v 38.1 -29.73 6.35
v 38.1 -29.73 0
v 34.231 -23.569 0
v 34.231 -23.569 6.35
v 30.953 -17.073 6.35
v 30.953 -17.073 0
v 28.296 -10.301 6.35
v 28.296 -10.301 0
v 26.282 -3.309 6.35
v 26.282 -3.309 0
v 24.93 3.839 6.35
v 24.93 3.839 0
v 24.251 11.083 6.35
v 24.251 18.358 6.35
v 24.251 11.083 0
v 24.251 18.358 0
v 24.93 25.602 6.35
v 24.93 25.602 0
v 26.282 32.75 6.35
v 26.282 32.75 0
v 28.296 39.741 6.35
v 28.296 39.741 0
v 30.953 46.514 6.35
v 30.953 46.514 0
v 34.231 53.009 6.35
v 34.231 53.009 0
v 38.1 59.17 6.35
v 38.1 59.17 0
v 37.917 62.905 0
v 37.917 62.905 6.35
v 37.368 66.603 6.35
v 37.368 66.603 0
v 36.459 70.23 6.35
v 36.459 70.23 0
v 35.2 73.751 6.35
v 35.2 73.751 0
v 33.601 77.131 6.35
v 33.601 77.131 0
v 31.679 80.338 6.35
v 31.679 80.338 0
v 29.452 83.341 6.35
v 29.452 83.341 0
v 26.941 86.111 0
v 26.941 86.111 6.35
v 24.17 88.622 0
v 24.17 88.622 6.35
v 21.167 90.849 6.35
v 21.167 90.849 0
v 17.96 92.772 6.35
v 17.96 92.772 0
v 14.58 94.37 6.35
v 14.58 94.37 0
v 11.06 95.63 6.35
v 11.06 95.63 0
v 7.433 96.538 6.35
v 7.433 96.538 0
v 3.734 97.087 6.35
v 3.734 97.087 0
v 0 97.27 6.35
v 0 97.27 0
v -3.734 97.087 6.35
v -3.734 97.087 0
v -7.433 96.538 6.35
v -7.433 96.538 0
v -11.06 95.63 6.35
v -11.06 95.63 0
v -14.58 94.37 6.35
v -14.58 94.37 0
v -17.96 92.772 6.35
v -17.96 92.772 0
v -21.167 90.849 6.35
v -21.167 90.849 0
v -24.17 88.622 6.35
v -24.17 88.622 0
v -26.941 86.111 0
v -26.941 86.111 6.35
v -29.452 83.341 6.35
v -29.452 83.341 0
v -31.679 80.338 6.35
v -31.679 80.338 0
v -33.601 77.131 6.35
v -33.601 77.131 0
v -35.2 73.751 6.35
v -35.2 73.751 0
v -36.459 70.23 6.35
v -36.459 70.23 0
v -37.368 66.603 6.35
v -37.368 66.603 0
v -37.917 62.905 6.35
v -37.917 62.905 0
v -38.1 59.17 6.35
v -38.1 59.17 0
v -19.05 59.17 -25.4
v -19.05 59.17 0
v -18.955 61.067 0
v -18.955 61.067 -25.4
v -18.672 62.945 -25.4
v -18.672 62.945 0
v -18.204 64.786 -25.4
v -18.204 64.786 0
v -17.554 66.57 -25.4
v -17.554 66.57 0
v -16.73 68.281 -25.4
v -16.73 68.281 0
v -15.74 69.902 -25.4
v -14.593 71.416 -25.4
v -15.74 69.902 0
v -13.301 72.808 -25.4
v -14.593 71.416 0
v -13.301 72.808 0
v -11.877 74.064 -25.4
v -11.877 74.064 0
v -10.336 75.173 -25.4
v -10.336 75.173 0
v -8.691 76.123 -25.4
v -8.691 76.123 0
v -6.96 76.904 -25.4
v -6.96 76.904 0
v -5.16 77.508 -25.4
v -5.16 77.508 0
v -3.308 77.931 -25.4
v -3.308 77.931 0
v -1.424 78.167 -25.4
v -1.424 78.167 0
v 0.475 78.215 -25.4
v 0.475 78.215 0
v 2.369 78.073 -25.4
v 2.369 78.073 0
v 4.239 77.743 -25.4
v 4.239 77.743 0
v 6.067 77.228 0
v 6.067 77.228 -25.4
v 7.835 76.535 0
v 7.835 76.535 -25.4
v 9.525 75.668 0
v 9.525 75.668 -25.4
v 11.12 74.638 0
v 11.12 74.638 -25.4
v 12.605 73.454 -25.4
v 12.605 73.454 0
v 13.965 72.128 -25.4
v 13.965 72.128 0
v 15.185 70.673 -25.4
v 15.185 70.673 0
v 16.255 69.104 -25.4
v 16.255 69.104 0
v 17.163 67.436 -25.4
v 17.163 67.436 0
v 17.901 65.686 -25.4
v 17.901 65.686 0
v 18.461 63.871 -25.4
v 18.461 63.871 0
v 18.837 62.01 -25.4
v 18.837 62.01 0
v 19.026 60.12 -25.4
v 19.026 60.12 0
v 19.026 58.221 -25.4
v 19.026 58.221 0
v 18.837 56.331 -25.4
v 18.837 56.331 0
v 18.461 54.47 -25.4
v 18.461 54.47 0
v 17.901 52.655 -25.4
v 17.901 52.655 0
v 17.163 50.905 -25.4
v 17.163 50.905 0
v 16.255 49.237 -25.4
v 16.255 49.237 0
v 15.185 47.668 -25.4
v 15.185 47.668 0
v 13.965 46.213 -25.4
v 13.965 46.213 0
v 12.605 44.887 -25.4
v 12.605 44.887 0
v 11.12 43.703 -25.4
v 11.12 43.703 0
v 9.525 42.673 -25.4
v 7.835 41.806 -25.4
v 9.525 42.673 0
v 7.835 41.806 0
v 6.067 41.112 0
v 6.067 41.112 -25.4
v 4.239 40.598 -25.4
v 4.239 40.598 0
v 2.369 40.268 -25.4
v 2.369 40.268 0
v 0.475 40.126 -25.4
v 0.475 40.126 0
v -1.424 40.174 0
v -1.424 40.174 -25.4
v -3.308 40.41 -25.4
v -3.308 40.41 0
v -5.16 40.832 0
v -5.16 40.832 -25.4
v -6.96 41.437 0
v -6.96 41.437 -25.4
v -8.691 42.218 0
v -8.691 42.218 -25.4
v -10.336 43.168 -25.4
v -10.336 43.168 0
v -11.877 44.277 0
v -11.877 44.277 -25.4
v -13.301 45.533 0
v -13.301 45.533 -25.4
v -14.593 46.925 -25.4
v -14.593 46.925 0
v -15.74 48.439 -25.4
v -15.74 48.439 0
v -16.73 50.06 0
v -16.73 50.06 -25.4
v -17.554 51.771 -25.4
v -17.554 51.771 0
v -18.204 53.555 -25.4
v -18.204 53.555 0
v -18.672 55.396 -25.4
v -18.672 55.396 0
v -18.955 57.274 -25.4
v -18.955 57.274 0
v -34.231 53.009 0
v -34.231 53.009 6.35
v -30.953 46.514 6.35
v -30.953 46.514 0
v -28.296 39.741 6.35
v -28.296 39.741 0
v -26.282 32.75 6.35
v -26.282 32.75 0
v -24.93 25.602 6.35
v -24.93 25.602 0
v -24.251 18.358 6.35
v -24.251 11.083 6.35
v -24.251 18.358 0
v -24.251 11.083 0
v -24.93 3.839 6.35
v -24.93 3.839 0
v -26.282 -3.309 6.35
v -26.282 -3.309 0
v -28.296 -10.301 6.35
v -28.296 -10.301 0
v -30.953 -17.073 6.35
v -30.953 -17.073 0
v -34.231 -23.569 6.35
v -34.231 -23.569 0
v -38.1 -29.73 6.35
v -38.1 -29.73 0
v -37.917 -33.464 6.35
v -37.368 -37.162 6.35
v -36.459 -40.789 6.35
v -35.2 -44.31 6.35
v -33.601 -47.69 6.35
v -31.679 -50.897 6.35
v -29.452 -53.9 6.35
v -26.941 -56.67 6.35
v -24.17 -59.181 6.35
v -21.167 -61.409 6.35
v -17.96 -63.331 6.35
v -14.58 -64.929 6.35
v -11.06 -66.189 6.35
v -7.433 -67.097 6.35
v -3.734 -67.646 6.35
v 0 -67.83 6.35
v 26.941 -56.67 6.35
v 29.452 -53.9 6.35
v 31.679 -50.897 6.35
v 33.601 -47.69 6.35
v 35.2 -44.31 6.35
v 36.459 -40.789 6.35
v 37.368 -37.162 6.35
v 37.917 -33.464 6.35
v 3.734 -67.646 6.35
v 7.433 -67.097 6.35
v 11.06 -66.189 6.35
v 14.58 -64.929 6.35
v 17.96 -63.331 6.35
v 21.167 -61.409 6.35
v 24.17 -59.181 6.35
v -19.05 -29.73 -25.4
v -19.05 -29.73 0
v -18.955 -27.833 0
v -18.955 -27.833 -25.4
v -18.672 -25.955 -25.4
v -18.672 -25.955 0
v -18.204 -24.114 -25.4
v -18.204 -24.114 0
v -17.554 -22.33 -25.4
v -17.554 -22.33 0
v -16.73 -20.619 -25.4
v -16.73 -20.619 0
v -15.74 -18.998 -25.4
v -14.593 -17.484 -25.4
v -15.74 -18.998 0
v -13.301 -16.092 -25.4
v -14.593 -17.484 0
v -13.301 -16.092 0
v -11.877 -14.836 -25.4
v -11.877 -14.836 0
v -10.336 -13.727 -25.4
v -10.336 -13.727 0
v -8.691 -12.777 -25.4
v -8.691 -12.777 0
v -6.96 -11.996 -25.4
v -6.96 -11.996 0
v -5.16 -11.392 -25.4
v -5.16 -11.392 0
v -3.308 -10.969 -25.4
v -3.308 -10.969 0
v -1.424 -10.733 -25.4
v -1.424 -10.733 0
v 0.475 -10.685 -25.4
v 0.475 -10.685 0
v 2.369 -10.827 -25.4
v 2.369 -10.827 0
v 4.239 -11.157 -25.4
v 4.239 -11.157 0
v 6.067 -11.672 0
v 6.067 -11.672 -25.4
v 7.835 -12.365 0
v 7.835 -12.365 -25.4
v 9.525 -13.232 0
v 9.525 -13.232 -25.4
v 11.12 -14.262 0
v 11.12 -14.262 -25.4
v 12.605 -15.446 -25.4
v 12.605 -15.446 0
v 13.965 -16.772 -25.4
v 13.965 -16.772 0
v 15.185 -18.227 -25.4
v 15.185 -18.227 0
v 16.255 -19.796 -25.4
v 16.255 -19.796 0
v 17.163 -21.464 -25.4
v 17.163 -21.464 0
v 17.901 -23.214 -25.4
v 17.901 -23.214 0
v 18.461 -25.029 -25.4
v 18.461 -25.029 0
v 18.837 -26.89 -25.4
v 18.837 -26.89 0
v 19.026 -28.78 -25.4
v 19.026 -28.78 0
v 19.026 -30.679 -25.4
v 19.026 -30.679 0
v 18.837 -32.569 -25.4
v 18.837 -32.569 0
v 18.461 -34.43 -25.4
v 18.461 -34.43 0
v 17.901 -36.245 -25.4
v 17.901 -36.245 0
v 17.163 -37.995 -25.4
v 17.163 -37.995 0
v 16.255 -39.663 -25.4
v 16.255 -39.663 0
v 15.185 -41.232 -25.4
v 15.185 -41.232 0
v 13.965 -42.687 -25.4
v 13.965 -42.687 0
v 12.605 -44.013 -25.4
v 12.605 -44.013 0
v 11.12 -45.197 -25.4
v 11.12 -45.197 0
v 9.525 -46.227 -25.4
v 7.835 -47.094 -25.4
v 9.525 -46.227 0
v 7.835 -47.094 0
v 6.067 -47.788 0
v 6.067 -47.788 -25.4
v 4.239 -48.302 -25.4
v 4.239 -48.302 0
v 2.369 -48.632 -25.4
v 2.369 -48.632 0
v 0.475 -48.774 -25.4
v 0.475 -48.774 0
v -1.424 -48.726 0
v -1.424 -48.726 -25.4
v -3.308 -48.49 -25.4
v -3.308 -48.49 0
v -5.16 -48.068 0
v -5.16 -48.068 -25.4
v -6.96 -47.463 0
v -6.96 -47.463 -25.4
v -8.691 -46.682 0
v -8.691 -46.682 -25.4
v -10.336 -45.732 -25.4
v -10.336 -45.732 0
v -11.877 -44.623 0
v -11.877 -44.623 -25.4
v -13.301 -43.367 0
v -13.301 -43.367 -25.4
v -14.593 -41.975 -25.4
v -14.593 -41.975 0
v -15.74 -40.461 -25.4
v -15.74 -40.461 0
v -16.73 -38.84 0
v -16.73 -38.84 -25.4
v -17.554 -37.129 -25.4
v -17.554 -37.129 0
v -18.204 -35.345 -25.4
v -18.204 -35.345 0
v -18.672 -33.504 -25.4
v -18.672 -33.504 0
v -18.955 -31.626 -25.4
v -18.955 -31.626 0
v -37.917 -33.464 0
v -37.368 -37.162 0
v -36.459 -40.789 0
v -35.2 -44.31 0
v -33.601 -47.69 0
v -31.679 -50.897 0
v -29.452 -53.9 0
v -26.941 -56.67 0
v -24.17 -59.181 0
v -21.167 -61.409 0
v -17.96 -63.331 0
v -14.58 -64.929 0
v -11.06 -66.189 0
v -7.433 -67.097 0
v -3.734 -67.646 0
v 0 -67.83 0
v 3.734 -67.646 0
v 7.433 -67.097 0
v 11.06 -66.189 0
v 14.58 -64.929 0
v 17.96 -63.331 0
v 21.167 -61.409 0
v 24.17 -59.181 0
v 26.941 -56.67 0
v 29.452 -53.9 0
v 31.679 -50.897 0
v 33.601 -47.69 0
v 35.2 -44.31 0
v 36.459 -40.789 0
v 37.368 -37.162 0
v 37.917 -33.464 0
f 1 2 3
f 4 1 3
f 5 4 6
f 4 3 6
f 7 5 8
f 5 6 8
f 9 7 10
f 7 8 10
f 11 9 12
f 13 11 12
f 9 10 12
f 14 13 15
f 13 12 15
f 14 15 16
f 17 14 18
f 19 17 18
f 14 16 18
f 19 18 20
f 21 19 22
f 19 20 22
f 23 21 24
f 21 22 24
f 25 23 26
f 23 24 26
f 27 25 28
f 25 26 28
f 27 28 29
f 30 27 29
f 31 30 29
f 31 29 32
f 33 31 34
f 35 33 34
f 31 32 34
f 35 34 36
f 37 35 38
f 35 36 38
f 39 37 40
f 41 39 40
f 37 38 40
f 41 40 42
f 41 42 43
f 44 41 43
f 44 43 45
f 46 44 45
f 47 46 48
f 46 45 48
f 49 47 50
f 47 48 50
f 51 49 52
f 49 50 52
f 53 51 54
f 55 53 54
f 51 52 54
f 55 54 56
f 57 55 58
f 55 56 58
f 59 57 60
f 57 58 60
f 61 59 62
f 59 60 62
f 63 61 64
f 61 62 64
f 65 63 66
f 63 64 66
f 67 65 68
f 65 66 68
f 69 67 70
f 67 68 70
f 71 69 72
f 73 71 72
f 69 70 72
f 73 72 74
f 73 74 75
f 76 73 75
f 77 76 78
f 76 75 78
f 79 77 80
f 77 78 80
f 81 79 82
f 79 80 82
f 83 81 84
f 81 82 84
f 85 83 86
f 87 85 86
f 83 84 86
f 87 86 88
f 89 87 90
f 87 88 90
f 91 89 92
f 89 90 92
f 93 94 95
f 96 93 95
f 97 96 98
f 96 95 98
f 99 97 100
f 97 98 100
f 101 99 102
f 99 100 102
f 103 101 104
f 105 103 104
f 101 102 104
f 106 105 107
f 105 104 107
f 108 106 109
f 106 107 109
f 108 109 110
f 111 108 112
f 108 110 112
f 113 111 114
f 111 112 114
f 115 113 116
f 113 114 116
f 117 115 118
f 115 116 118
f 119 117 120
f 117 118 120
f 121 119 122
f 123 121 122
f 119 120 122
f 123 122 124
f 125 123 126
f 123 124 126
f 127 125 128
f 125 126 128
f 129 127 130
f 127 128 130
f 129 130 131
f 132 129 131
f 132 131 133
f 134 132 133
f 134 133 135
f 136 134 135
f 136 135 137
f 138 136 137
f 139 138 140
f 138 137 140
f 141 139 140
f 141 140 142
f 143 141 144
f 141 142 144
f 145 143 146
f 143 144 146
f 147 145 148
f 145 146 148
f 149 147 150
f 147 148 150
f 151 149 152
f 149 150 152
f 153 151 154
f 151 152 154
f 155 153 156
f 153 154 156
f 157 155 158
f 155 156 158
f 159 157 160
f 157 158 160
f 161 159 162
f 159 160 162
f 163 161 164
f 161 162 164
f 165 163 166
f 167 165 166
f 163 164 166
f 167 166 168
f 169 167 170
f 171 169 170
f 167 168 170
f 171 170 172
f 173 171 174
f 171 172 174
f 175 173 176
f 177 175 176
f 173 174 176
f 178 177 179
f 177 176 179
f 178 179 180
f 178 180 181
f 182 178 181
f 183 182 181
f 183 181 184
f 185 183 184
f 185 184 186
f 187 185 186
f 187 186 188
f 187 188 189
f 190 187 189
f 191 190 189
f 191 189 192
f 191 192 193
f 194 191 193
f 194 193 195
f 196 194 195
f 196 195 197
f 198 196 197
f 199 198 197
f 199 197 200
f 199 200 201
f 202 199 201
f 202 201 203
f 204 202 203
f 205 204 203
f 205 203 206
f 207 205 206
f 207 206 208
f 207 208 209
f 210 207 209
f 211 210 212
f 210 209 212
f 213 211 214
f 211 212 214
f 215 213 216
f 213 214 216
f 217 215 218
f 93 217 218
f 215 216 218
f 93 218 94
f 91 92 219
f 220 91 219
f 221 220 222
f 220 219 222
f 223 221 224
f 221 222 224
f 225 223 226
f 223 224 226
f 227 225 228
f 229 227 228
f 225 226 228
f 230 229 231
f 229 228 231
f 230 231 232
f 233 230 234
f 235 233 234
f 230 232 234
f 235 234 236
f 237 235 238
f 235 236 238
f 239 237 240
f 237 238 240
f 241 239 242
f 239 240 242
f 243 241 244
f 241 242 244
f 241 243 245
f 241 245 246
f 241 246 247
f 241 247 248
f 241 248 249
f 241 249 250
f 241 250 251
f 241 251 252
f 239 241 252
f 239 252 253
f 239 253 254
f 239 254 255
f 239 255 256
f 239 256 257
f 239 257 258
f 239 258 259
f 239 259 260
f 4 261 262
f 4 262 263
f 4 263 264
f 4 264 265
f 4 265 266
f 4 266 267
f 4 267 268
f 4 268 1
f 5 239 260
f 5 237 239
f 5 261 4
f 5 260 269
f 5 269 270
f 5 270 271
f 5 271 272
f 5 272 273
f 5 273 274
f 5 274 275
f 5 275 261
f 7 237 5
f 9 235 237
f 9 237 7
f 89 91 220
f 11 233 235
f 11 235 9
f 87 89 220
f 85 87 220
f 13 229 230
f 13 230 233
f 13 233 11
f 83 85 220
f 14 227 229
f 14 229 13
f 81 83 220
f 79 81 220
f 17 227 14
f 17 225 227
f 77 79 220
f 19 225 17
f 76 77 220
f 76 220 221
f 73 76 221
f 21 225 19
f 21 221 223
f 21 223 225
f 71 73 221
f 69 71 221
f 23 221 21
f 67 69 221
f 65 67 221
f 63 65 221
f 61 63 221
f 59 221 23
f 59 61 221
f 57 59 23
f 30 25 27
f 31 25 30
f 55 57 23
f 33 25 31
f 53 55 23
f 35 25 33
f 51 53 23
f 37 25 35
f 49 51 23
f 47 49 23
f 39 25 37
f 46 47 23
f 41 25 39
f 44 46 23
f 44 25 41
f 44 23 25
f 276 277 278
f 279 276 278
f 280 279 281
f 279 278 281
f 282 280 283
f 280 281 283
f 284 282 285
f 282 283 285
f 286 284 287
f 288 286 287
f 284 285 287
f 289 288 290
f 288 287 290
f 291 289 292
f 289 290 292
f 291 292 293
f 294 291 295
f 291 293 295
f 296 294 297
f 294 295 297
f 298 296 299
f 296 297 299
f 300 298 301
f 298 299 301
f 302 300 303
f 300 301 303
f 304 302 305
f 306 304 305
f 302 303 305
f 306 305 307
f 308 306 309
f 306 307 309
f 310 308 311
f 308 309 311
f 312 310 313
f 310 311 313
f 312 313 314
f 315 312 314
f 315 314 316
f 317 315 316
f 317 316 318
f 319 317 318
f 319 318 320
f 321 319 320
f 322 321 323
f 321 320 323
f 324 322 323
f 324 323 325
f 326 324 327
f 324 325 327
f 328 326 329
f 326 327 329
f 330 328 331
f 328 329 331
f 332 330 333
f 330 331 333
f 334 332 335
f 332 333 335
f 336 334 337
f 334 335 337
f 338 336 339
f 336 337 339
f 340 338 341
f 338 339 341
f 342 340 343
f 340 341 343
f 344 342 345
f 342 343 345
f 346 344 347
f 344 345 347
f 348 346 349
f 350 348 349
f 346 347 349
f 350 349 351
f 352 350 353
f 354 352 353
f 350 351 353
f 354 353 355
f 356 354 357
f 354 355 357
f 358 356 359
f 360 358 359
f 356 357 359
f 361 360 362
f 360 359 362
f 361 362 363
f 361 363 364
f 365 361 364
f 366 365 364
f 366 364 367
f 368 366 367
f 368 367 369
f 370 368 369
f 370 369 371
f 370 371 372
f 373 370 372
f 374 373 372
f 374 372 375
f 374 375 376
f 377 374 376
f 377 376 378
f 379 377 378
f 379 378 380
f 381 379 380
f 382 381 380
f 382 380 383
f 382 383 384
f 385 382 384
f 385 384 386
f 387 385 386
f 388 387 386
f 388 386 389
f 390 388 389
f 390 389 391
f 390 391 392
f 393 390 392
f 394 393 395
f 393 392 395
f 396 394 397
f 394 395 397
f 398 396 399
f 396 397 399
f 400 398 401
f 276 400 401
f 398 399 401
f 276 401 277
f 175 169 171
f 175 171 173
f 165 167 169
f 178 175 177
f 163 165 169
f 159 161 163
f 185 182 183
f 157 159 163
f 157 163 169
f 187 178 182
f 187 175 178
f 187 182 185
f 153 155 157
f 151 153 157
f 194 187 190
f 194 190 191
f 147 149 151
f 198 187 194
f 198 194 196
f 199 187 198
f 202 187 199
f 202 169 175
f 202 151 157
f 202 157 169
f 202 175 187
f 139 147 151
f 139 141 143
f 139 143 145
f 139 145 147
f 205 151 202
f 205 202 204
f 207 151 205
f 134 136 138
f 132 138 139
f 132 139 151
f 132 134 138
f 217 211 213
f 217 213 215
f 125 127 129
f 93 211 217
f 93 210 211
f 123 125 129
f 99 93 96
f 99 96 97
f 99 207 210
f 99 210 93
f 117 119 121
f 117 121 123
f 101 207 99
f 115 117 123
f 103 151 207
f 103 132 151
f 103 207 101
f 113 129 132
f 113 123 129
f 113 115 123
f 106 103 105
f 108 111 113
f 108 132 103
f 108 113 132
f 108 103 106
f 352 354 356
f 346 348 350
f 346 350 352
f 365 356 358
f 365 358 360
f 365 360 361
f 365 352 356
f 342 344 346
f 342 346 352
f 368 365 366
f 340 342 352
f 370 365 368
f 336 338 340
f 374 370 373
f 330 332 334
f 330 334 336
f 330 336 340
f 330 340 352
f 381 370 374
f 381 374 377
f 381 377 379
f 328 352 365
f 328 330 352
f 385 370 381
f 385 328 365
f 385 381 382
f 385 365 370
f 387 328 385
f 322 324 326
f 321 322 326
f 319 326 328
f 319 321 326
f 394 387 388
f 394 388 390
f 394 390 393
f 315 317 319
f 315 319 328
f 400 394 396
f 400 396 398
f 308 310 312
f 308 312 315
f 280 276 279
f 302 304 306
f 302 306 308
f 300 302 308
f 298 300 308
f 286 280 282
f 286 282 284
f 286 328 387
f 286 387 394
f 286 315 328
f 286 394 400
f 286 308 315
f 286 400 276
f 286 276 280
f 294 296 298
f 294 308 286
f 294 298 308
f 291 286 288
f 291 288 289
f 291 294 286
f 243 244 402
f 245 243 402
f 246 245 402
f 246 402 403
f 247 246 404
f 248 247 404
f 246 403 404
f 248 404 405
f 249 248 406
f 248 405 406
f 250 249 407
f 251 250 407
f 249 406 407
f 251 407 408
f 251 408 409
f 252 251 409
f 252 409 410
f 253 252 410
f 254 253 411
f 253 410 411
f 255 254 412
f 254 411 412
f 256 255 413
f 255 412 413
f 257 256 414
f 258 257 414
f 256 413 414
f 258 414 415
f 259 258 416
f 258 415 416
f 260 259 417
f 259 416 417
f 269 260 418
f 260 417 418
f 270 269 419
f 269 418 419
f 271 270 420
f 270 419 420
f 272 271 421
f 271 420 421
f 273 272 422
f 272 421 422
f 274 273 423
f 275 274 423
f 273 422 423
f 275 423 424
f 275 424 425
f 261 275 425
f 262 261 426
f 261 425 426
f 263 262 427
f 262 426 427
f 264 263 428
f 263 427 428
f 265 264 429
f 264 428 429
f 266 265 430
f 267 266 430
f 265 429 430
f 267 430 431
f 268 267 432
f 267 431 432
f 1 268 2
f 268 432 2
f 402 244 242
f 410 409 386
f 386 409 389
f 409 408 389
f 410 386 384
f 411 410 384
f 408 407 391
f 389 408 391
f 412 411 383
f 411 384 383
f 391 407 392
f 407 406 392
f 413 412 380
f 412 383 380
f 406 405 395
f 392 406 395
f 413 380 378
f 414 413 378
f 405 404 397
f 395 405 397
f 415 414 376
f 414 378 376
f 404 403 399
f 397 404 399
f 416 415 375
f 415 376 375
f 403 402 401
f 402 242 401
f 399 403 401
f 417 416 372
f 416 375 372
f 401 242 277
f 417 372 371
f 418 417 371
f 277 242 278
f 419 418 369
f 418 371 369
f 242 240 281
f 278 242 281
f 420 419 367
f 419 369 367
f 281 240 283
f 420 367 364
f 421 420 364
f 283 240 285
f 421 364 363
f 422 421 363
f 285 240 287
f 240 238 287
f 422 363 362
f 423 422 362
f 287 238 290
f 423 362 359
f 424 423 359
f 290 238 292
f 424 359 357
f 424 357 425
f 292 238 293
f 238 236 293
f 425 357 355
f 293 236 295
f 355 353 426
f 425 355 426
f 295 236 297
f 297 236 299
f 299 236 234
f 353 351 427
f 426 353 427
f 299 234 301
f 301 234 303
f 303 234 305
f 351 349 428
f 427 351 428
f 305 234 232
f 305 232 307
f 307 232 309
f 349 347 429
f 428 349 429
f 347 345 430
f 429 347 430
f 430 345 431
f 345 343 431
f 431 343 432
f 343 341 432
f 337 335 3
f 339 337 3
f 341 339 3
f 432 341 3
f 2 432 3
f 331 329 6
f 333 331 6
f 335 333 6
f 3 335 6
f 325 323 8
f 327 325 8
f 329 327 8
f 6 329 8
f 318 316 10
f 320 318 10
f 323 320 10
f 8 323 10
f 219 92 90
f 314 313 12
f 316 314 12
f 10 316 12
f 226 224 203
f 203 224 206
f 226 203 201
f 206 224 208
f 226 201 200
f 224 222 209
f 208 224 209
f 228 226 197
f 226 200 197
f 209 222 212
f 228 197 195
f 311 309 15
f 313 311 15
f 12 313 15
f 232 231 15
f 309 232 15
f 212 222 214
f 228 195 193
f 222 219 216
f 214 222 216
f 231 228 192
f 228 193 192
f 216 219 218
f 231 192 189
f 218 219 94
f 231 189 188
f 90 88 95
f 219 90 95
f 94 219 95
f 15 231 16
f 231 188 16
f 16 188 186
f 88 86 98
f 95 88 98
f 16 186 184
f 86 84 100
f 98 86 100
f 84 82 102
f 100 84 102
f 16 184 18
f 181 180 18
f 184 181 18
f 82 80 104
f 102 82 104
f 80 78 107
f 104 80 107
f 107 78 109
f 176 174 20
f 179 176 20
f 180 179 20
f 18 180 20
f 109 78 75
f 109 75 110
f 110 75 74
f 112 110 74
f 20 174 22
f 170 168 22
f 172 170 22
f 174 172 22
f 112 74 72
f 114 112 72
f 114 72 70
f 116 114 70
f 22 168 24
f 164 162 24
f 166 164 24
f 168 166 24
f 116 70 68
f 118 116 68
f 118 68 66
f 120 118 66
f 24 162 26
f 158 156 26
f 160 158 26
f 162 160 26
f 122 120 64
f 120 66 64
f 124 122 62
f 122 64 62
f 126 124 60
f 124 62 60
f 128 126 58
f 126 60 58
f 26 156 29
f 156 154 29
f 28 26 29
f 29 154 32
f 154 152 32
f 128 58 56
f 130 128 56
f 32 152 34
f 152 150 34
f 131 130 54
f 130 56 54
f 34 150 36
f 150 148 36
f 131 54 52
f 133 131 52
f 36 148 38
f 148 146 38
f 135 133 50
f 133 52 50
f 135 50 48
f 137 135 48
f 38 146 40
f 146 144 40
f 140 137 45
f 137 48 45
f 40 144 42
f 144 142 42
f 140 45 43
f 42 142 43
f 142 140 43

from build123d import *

# Parameters (mm, degrees)
BOSS_EXTRUDE1_DEPTH = 6.35
SKETCH2_R           = 19.05
BOSS_EXTRUDE2_DEPTH = 25.4


with BuildPart() as part:
    # Sketch1 → Boss-Extrude1 (new body)
    with BuildSketch(Plane.XY):
        with BuildLine():
            ThreePointArc((38.1, 59.170454545), (0, 97.270454545), (-38.1, 59.170454545))
            ThreePointArc((-38.1, 59.170454545), (-24.166339939, 14.720454545), (-38.1, -29.729545455))
            ThreePointArc((-38.1, -29.729545455), (0, -67.829545455), (38.1, -29.729545455))
            ThreePointArc((38.1, -29.729545455), (24.166339939, 14.720454545), (38.1, 59.170454545))
        make_face()
    extrude(amount=BOSS_EXTRUDE1_DEPTH)

    # Sketch2 → Boss-Extrude2 (add)
    with BuildSketch(Plane(origin=(0, 0, 0), x_dir=(-1, 0, 0), z_dir=(0, 0, -1))):
        with Locations((0, 59.170454545)):
            Circle(SKETCH2_R)
        with Locations((0, -29.729545455)):
            Circle(SKETCH2_R)
    extrude(amount=BOSS_EXTRUDE2_DEPTH)


solid = part.part
